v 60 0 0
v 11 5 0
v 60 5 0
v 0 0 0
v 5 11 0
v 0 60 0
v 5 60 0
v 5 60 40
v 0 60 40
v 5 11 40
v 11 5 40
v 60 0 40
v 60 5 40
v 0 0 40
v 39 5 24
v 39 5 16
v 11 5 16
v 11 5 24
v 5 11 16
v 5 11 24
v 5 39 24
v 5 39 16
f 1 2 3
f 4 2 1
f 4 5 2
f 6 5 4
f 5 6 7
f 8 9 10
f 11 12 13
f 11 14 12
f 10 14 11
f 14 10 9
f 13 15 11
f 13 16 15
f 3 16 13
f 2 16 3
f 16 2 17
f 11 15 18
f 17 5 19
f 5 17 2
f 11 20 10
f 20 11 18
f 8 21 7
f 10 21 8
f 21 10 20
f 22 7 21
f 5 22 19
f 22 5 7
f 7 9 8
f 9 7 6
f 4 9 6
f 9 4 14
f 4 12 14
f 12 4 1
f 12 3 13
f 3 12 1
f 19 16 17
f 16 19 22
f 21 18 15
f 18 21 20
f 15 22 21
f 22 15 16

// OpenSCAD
// Heavy-Duty Reinforced Structural L-Bracket — Generated by 3D Model Studio
$fn = 64;
flange_a = 60.0;
flange_b = 60.0;
width = 40.0;
thickness = 5.0;
fillet_r = 6.0;
gusset_t = 8.0;
gusset_len = 34.0;
hole_d = 4.5;

difference() {
    union() {
        // Flange A & B with inner root fillet
        linear_extrude(height = width)
        polygon(points = [
            [0, 0], [flange_a, 0], [flange_a, thickness],
            [thickness + fillet_r, thickness], [thickness, thickness + fillet_r],
            [thickness, flange_b], [0, flange_b]
        ]);
        // Central Structural Gusset Rib
        translate([0, 0, (width - gusset_t)/2])
        linear_extrude(height = gusset_t)
        polygon(points = [
            [thickness, thickness],
            [thickness + gusset_len, thickness],
            [thickness, thickness + gusset_len]
        ]);
    }
}
